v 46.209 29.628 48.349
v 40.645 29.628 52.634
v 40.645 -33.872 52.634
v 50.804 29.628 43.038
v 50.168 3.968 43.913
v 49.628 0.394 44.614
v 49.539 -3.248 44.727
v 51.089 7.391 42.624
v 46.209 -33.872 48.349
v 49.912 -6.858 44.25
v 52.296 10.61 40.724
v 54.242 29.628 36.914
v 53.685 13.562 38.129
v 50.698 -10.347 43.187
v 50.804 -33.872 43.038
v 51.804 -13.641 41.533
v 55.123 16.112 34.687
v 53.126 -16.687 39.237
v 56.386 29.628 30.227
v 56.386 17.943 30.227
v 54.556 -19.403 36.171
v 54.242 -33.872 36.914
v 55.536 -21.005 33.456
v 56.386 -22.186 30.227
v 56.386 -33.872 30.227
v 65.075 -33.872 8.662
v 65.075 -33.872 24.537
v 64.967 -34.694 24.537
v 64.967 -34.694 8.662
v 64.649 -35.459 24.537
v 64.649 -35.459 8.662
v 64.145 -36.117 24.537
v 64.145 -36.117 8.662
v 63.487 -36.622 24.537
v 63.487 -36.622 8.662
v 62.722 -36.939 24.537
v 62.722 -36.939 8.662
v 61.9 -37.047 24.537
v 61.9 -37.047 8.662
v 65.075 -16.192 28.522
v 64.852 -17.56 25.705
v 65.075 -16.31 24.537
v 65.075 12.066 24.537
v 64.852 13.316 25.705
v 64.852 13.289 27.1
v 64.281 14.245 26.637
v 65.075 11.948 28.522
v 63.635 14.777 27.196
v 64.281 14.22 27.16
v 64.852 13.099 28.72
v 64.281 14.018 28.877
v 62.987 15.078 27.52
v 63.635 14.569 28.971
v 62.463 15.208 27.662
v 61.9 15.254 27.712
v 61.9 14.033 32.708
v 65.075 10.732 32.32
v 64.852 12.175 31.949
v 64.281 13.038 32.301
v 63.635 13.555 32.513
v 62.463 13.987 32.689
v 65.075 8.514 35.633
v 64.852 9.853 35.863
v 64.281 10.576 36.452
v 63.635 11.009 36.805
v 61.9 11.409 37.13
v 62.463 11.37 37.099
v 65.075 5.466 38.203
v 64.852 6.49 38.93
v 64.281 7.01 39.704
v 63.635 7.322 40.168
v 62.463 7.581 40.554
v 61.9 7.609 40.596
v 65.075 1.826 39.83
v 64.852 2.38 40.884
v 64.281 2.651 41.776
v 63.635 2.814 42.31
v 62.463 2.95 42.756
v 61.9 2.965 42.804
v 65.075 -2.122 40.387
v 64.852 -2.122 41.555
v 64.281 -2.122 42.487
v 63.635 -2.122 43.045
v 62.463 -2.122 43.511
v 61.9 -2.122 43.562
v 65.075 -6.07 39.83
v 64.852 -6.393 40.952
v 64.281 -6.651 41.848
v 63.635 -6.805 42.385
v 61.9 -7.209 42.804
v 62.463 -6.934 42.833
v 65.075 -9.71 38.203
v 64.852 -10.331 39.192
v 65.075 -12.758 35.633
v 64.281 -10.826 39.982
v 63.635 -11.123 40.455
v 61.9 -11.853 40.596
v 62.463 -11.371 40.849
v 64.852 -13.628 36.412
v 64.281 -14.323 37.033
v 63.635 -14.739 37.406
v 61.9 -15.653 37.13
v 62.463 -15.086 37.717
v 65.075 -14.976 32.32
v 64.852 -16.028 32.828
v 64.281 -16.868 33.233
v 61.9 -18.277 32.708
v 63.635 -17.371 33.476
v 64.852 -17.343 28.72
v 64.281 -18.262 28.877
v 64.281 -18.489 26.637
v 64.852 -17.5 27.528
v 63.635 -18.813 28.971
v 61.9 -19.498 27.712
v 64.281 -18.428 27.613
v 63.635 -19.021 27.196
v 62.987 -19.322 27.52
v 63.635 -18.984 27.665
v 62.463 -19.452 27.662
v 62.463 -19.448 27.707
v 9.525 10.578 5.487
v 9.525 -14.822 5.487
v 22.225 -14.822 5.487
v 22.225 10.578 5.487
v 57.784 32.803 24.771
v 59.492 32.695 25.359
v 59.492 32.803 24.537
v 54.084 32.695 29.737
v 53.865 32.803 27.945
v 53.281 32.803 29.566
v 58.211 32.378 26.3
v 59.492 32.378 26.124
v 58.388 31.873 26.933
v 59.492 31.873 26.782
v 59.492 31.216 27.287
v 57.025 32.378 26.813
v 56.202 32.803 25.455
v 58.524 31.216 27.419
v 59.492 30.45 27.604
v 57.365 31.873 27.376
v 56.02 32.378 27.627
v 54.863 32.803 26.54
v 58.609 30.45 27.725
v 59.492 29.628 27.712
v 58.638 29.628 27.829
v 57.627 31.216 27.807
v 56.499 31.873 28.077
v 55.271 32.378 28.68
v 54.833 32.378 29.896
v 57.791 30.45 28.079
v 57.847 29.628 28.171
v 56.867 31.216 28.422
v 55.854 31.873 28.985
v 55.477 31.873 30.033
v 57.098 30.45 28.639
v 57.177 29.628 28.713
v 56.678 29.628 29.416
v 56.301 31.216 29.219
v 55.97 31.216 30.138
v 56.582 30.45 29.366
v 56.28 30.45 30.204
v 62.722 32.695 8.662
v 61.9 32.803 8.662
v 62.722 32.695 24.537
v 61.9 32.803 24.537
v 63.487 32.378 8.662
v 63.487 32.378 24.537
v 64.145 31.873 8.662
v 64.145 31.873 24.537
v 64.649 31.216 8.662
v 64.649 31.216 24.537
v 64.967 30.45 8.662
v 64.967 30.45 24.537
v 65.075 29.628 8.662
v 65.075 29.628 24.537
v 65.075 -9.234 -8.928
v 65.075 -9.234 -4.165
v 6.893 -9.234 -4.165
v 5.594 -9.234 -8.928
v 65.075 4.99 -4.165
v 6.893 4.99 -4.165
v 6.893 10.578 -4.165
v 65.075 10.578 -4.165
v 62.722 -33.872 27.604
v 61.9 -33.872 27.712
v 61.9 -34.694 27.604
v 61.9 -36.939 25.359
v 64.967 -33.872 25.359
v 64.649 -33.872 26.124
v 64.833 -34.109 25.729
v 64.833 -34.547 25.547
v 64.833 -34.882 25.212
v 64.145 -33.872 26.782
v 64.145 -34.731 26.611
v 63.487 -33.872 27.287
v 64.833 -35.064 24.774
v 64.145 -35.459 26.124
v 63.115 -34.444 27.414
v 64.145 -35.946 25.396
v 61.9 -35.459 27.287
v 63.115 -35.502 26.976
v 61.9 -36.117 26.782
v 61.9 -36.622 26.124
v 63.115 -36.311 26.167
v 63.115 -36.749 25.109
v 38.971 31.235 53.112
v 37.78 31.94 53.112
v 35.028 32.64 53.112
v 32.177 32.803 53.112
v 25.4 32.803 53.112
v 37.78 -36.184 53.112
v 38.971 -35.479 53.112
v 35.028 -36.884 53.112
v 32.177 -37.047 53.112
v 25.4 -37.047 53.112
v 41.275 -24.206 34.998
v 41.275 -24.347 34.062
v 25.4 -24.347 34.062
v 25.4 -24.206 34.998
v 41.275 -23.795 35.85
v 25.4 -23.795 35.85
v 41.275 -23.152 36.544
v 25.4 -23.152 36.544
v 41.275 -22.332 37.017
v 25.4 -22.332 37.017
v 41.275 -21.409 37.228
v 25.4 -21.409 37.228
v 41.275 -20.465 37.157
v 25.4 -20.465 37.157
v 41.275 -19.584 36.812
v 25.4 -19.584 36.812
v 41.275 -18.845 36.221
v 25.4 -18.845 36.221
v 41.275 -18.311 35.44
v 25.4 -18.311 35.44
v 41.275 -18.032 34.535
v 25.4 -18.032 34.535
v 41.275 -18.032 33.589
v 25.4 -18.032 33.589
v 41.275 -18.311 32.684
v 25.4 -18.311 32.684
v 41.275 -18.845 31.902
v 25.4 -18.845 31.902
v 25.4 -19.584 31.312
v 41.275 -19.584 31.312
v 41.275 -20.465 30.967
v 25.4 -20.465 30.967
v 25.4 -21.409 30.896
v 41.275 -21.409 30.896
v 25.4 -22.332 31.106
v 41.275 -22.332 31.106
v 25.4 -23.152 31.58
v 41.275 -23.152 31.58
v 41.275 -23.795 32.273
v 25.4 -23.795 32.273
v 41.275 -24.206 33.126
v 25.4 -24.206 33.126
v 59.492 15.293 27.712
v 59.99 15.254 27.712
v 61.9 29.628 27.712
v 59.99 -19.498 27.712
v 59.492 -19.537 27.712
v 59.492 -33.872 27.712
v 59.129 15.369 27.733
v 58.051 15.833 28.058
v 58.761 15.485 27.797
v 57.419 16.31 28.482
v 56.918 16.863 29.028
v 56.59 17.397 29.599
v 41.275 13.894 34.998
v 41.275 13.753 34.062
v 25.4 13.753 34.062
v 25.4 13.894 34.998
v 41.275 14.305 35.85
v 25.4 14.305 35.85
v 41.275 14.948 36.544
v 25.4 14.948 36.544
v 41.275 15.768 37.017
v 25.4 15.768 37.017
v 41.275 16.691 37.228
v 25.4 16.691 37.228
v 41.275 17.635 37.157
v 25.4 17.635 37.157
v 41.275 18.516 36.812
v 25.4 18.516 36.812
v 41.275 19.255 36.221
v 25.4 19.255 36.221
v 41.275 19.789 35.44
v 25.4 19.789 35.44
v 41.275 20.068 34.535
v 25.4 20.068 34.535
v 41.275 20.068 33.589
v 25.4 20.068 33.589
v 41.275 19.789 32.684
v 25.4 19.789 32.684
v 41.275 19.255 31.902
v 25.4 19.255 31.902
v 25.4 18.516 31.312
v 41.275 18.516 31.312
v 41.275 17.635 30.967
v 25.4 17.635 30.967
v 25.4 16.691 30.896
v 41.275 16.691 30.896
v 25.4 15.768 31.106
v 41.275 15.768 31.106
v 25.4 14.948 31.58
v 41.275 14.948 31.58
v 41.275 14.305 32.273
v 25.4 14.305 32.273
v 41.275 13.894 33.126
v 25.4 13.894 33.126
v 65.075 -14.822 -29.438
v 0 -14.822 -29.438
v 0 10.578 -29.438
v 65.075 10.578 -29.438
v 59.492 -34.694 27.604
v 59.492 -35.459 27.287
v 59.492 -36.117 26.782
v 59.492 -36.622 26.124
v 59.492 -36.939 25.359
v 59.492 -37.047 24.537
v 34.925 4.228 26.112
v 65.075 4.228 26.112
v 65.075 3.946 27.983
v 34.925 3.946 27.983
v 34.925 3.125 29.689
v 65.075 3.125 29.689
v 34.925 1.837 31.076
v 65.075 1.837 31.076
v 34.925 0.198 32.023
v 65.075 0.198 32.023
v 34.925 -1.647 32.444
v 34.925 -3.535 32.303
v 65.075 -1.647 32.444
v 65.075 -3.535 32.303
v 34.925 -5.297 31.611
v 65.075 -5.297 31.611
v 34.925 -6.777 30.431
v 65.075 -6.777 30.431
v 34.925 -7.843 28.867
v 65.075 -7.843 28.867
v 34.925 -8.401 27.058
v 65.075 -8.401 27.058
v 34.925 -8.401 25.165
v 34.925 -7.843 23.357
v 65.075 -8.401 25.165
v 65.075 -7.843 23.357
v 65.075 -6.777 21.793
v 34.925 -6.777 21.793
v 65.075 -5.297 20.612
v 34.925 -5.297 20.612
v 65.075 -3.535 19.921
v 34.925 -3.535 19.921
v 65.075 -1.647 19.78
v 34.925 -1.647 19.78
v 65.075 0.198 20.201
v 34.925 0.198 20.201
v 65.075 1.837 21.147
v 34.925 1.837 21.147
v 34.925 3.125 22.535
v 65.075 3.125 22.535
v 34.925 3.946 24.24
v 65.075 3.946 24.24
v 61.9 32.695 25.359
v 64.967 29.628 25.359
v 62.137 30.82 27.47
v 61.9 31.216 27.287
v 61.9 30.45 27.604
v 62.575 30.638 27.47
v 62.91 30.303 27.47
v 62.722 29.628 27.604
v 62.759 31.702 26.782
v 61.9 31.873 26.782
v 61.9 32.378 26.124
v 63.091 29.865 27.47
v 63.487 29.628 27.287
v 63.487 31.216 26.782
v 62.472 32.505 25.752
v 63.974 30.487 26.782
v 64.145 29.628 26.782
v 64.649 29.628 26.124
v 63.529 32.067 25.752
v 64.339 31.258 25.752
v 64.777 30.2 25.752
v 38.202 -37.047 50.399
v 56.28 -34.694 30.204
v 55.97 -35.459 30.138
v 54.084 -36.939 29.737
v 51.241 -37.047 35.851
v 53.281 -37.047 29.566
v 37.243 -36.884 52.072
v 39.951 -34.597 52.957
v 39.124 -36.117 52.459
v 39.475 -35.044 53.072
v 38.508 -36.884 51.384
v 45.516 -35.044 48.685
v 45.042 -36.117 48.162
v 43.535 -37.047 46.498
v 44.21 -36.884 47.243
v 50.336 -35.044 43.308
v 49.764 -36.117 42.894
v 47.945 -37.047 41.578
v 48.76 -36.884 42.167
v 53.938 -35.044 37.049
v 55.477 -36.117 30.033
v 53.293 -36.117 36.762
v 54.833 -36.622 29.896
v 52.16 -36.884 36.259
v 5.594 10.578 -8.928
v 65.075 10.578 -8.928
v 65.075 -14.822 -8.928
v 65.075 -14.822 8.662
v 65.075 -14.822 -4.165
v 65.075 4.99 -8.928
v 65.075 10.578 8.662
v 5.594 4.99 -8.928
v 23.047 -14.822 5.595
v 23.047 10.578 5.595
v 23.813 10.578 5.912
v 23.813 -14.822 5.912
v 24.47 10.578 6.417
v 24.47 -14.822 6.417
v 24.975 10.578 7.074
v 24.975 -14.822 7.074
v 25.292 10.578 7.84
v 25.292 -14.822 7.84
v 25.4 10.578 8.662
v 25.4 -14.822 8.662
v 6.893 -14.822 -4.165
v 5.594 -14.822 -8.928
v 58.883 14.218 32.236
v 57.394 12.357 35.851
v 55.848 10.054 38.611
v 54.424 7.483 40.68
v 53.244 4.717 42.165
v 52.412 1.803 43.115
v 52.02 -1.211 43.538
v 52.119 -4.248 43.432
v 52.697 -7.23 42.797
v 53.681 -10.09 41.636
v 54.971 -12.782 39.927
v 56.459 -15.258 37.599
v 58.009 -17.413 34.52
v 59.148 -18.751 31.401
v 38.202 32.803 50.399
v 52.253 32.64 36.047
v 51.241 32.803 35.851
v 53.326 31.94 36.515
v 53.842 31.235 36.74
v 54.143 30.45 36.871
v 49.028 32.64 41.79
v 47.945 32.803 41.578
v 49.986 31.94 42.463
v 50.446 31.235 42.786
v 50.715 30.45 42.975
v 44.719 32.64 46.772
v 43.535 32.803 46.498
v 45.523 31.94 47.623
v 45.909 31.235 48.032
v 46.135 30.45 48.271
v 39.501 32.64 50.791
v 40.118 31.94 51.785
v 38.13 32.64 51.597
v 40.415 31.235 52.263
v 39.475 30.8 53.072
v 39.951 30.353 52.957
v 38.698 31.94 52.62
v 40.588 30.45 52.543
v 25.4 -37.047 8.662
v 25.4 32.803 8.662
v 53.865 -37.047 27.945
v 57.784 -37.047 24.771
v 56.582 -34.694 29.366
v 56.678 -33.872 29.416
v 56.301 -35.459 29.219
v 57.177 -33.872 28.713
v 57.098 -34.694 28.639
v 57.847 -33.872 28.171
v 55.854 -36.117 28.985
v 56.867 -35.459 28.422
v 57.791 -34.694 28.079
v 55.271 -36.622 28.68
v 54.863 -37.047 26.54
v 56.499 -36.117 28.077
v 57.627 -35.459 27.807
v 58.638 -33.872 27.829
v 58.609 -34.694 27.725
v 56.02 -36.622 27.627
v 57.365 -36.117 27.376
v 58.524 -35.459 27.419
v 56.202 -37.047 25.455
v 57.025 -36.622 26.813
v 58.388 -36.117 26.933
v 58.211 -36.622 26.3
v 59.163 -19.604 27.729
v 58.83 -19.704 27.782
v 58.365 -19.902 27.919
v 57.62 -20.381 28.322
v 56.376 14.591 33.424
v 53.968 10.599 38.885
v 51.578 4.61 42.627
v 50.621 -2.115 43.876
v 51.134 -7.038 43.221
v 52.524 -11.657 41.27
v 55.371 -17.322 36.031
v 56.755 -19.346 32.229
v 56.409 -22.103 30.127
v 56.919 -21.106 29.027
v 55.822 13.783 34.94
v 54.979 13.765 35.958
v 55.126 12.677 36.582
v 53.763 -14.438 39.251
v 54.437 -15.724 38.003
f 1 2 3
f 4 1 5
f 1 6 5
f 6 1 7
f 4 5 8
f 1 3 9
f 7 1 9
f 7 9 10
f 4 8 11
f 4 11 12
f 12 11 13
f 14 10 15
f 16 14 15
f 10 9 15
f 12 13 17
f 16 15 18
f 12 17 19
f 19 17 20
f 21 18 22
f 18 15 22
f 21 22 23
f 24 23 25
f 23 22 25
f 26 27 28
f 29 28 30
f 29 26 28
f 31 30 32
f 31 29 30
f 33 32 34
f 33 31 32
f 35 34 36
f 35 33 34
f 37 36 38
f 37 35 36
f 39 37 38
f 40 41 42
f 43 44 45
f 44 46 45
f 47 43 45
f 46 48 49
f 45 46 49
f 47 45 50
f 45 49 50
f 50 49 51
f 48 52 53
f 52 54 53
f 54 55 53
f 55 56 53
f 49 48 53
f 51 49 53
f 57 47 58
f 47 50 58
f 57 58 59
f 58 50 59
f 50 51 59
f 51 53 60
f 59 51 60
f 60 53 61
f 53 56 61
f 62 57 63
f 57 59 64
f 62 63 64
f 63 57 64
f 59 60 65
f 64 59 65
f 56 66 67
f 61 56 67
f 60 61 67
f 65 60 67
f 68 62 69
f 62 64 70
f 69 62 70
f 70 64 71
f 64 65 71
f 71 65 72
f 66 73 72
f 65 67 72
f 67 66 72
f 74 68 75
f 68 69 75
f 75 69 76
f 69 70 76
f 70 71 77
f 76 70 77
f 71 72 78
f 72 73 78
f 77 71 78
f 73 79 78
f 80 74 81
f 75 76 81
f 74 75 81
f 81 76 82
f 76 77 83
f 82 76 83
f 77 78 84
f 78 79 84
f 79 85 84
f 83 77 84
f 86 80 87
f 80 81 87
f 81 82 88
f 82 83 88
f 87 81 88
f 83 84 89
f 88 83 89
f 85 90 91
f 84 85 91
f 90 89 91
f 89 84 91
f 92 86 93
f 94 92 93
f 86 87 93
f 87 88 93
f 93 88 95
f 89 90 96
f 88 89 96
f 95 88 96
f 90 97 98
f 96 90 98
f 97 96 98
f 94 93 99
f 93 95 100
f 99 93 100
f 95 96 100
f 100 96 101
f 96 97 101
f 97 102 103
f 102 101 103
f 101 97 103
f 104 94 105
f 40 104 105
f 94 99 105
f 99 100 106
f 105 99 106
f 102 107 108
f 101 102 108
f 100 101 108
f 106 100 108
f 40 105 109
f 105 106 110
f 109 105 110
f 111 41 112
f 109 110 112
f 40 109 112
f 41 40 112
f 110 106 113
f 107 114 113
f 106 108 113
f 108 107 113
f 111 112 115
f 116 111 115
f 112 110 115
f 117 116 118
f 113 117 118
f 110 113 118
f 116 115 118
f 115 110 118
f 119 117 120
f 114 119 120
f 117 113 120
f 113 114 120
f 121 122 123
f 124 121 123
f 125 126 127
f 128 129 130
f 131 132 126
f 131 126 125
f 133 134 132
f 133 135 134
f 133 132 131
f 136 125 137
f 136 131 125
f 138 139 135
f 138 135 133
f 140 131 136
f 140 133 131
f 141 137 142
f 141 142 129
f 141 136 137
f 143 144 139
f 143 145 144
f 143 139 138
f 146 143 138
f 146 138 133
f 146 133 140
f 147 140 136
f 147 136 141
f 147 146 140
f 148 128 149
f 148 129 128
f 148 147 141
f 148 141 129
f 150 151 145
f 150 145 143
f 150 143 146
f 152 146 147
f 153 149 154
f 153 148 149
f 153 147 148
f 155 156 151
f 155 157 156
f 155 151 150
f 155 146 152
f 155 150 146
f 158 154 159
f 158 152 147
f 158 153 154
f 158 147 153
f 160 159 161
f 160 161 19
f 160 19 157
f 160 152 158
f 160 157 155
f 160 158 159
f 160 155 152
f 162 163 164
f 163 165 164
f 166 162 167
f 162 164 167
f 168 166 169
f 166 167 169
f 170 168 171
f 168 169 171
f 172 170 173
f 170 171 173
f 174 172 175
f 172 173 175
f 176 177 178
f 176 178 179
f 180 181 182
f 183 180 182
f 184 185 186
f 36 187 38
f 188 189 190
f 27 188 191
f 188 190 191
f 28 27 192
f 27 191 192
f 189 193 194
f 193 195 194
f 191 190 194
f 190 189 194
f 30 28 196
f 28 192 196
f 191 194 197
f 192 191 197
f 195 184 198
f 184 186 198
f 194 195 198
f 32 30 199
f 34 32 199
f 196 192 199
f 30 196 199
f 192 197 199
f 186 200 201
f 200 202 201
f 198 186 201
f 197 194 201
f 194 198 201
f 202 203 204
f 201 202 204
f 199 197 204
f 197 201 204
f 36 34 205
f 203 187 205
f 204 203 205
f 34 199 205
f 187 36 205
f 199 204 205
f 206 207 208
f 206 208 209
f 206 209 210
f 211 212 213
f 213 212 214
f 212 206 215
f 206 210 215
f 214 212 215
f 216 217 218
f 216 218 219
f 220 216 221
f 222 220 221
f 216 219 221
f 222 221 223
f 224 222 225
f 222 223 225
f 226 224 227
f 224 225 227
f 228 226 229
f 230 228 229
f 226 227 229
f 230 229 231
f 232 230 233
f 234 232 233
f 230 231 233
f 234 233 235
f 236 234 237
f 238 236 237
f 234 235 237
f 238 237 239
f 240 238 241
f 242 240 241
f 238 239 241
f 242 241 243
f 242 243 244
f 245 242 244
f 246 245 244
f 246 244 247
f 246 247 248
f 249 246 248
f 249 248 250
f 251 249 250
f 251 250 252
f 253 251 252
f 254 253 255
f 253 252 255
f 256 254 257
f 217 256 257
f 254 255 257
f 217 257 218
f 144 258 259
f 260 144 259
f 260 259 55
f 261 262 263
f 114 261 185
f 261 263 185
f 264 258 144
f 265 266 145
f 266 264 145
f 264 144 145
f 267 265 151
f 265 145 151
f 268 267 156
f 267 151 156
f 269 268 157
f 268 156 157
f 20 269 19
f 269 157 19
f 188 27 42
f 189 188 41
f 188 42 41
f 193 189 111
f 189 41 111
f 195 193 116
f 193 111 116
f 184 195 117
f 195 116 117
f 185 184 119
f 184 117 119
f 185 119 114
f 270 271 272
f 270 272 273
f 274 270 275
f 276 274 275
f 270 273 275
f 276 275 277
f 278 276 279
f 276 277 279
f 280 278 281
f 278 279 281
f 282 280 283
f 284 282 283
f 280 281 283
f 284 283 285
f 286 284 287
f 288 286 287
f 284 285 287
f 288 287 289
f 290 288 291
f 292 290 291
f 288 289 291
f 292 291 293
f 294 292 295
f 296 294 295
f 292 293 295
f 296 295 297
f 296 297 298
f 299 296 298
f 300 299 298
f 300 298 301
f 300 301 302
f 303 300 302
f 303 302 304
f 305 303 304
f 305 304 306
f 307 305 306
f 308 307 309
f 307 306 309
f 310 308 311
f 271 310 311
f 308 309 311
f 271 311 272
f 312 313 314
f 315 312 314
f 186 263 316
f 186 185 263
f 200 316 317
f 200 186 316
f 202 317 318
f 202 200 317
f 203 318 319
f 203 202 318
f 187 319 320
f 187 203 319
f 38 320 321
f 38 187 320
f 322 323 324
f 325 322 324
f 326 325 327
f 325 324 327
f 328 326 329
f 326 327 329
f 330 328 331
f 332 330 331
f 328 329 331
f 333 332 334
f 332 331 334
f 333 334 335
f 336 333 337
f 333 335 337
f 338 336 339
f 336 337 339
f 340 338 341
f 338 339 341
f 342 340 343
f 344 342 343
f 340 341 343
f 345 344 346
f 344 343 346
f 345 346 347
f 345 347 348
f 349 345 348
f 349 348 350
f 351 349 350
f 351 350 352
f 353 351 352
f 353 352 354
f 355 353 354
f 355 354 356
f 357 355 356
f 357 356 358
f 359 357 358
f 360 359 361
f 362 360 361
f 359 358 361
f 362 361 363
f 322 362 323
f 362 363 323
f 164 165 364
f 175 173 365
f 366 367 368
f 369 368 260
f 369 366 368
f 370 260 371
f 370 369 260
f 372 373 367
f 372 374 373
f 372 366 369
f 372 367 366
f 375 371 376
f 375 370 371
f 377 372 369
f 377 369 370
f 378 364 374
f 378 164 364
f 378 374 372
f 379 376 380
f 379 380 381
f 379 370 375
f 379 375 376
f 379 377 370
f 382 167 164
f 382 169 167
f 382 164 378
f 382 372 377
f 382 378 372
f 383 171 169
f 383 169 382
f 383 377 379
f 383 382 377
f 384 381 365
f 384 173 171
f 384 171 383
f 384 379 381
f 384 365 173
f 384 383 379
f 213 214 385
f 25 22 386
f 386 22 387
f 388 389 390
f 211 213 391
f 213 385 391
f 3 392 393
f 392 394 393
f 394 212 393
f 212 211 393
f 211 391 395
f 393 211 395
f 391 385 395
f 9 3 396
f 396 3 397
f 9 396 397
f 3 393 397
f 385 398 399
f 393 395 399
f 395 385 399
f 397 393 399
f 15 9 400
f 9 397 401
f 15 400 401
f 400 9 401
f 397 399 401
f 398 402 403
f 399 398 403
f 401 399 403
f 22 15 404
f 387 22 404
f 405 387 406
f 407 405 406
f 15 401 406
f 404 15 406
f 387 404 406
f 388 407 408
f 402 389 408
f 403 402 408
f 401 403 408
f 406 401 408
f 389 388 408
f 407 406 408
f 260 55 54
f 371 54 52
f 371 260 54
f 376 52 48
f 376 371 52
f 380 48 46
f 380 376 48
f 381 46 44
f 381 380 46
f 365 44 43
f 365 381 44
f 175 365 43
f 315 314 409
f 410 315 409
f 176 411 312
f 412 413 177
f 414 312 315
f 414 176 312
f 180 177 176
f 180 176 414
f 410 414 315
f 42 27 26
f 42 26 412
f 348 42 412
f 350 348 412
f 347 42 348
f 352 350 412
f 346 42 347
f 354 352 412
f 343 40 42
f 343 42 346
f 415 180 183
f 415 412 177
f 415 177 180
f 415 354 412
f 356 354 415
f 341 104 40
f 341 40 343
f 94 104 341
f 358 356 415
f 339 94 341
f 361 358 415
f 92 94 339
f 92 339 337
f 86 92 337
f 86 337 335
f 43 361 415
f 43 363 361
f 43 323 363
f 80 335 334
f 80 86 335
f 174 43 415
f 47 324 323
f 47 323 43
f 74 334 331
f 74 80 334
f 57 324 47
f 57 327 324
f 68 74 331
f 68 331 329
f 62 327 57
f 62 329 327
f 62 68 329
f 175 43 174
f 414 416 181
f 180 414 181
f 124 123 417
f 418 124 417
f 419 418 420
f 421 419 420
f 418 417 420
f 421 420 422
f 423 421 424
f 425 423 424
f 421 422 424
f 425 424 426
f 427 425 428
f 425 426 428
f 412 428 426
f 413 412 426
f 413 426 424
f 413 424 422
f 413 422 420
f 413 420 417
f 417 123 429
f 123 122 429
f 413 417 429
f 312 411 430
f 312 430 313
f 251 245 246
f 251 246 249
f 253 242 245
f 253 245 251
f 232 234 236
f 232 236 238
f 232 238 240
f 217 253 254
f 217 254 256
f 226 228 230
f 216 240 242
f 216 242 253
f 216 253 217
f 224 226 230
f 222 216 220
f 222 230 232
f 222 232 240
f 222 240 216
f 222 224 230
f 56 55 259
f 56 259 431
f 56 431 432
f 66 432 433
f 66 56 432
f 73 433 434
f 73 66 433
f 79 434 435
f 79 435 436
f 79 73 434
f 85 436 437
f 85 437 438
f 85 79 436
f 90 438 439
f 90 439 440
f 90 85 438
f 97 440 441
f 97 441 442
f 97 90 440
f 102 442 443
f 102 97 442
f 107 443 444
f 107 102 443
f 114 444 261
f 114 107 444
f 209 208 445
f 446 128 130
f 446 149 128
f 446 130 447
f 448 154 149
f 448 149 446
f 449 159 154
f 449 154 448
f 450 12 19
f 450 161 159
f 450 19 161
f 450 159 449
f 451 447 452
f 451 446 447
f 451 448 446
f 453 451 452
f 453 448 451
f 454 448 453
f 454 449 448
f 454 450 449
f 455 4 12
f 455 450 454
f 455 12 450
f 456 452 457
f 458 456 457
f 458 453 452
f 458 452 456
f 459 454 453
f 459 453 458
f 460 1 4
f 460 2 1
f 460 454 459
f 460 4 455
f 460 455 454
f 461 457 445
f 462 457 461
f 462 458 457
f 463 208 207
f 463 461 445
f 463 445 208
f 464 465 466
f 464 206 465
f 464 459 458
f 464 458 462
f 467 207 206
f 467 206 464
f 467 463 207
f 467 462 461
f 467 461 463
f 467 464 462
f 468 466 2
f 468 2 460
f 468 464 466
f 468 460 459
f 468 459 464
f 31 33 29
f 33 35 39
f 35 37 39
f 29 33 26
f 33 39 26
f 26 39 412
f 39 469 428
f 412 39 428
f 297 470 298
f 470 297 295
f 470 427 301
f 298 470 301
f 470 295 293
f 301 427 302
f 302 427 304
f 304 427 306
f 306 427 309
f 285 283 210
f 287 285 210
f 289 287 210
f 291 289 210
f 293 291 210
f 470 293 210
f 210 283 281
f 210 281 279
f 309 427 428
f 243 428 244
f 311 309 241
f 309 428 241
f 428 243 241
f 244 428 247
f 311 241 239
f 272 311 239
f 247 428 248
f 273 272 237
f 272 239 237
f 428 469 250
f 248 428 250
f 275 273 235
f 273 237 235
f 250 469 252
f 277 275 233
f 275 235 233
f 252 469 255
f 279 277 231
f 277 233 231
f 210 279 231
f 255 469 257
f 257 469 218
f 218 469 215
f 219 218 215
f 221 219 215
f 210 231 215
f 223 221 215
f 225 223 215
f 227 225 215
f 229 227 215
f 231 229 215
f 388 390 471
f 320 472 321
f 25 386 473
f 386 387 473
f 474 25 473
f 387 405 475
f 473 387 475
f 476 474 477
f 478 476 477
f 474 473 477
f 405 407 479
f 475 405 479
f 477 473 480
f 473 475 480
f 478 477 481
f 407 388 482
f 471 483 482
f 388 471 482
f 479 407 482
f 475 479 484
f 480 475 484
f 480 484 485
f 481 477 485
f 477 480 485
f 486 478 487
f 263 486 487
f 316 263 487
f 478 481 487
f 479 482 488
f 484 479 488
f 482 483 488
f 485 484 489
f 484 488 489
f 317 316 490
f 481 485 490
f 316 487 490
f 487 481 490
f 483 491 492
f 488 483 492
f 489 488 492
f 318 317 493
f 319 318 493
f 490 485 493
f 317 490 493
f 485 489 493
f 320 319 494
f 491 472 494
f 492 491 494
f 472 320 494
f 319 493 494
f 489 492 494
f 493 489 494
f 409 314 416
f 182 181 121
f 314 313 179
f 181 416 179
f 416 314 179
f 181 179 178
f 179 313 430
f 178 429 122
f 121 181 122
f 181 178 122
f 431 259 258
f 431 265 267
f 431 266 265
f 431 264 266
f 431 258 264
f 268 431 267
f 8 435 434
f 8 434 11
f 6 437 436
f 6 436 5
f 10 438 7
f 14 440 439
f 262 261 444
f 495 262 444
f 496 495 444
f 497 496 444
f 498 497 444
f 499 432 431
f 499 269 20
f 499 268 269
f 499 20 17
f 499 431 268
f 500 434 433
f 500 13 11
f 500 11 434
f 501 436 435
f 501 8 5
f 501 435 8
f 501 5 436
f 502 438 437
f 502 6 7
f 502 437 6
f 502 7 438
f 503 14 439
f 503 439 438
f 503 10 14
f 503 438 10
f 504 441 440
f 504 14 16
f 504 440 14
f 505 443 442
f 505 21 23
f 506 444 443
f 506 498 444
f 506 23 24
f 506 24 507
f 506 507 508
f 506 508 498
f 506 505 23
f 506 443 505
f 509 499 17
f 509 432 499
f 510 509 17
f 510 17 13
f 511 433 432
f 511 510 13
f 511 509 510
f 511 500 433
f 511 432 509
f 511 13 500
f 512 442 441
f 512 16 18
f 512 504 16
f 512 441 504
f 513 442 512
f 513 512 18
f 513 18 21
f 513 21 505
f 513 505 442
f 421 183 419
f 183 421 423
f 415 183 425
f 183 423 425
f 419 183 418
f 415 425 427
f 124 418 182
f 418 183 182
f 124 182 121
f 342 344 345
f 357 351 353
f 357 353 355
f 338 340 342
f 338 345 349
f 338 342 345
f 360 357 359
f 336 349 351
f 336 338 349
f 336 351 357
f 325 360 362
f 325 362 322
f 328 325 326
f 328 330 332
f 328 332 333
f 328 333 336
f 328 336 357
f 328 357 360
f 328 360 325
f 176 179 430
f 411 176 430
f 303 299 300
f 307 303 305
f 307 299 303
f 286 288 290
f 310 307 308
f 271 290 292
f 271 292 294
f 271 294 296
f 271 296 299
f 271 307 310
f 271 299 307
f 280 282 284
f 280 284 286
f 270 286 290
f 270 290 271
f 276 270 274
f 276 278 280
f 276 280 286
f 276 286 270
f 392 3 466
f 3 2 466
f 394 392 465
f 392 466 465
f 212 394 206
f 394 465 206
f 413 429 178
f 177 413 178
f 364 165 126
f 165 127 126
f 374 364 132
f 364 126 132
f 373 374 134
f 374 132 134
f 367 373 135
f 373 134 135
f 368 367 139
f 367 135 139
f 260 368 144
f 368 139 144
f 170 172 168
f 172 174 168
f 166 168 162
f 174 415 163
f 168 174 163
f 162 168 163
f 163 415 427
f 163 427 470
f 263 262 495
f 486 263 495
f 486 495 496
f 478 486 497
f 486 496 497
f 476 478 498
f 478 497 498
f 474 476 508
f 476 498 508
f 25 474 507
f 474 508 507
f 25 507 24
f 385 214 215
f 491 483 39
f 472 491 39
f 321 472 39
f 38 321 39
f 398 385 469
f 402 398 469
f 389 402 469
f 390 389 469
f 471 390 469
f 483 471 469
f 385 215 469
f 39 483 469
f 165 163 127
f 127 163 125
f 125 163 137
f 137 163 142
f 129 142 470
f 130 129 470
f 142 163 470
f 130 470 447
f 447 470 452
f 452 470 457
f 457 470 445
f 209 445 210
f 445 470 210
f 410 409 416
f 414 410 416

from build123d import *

# Parameters (mm, degrees)
F1_DEPTH = 65.0748
F3_DEPTH = 69.851
F4_R     = 17.4498
F5_DEPTH = 25.4
F6_R     = 6.35
F7_DEPTH = 30.1498
F8_R     = 3.175
F9_DEPTH = 15.875
F10_F1_R = 3.175
F10_F2_R = 3.175


with BuildPart() as f1:
    # F0 (on Right) → F1 (new body)
    with BuildSketch(Plane.YZ):
        Polygon((32.8030504316, 53.1119473694), (-37.0469495684, 53.1119473694), (-37.0469495684, 8.6619473694), (-14.8219495684, 8.6619473694), (-14.8219495684, -4.1650526306), (-9.2339495684, -4.1650526306), (-9.2339495684, -8.9275526306), (-14.8219495684, -8.9275526306), (-14.8219495684, -29.4380526306), (10.5780504316, -29.4380526306), (10.5780504316, -8.9275526306), (4.9900504316, -8.9275526306), (4.9900504316, -4.1650526306), (10.5780504316, -4.1650526306), (10.5780504316, 8.6619473694), (32.8030504316, 8.6619473694), align=None)
    extrude(amount=F1_DEPTH)

    # F2 (on face) → F3 (cut, through all)
    with BuildSketch(Plane.XZ.offset(37.0469495684)):
        with BuildLine():
            ThreePointArc((22.225, 5.4869473694), (24.4700640303, 6.4168833391), (25.4, 8.6619473694))
            Line((25.4, 8.6619473694), (0, 8.6619473694))
            Line((0, 8.6619473694), (0, -29.4380526306))
            Line((0, -29.4380526306), (9.525, 5.4869473694))
            Line((9.525, 5.4869473694), (22.225, 5.4869473694))
        make_face()
        Polygon((25.4, 27.7119473694), (25.4, 53.1119473694), (0, 53.1119473694), (0, 8.6619473694), (25.4, 8.6619473694), align=None)
        with BuildLine():
            Line((65.0748, 53.1119473694), (39.8529659904, 53.1119473694))
            ThreePointArc((39.8529659904, 53.1119473694), (51.2636522621, 42.3660722249), (56.8255061373, 27.7119473694))
            Line((56.8255061373, 27.7119473694), (65.0748, 27.7119473694))
            Line((65.0748, 27.7119473694), (65.0748, 53.1119473694))
        make_face()
    extrude(amount=-F3_DEPTH, mode=Mode.SUBTRACT)

    # F4 (on face) → F5 (join)
    with BuildSketch(Plane.YZ.offset(65.0748)):
        with Locations((-2.1219495684, 26.1117473694)):
            Circle(F4_R)
    extrude(amount=-F5_DEPTH)

    # F6 (on face) → F7 (cut)
    with BuildSketch(Plane.YZ.offset(65.0748)):
        with Locations((-2.1219495684, 26.1117473694)):
            Circle(F6_R)
    extrude(amount=-F7_DEPTH, mode=Mode.SUBTRACT)

    # F8 (on face) → F9 (cut)
    with BuildSketch(Plane(origin=(25.4, 0, 0), x_dir=(0, -1, 0), z_dir=(-1, 0, 0))):
        with Locations((-16.9280504316, 34.0619473694)):
            Circle(F8_R)
        with Locations((21.1719495684, 34.0619473694)):
            Circle(F8_R)
    extrude(amount=-F9_DEPTH, mode=Mode.SUBTRACT)

    # F10: fillet of radius 3.175 on 12 edges, made by hand

    # F10_f1
    f10_f1_edges = [f1.edges().sort_by_distance(p)[0] for p in [
        (50.428197841, -2.1264417395, 43.5615467912),
        (56.8255061373, -28.2725863076, 27.7119473694),
        (56.8255061373, 24.0286871709, 27.7119473694),
    ]]
    fillet(f10_f1_edges, radius=F10_F1_R)

    # F10_f2
    f10_f2_edges = [f1.edges().sort_by_distance(p)[0] for p in [
        (50.5351306509, -37.0469495684, 43.4143386342),
        (62.2832541328, -37.0469495684, 27.7119473694),
        (65.0748, 32.8030504316, 18.1869473694),
        (50.5351306509, 32.8030504316, 43.4143386342),
        (39.8529659904, -2.1219495684, 53.1119473694),
        (65.0748, -28.2725863076, 27.7119473694),
        (65.0748, -2.1219495684, 43.5615473694),
        (65.0748, 24.0286871709, 27.7119473694),
        (65.0748, -37.0469495684, 18.1869473694),
        (57.4937274099, 32.8030504316, 28.4194187475),
        (57.4937274099, -37.0469495684, 28.4194187475),
    ]]
    fillet(f10_f2_edges, radius=F10_F2_R)


solid = f1.part
